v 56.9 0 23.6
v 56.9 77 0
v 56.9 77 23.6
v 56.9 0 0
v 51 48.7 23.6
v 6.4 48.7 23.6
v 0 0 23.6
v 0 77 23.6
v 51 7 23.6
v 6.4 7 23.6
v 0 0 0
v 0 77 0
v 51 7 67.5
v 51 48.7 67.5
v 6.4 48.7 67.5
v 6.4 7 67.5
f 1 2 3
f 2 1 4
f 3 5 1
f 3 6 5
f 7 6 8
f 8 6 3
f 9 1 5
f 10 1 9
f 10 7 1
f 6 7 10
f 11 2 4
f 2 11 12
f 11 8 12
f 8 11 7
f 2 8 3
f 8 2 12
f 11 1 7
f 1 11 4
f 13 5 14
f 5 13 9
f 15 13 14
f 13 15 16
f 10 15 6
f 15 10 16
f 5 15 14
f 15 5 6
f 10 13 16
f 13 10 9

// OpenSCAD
// file: settings.scad
// we will define a bayit to have a top cube (where the scroll(s) go) and a base rectangle
// each will have x, y, and z measurements
// also we need an offset to locate the cube on top of the base

// these measurements are from my rashi shel rosh (shins on the sides are already factored in)
top = [44.6, 41.7, 43.9];
base = [56.9, 77.0, 23.6];
offset = [6.4, 7.0, base.z];

strap_width = 16;

padding_thickness = 1; // thickness of the padding you will put inside the box. in my case i have 1mm thick felt
bevel_radius = 3; // and wall thickness

/////// hinge related settings (best not to touch) ///////
bump = [bevel_radius*0.8, 0.4, 55]; // diameter, height, angle
arm = [bevel_radius, 1, 0, 0];  // height, thickness, extra, esides
dim = [base.x, 26, 0.1];  // len, hinges(>=2), clearance, 0:male 1:female 2:reverable
patt = [0, 1];  // 0:bump-norm 1:bump-rev 2:dimp-norm 3:dimp:rev

hinge = [dim, patt, arm, bump];
// main file
$fa = 1;
$fs = 0.4;

include <settings.scad>

module bayit() {
    cube(base);
    translate(offset)
    cube(top);
}

bayit();
